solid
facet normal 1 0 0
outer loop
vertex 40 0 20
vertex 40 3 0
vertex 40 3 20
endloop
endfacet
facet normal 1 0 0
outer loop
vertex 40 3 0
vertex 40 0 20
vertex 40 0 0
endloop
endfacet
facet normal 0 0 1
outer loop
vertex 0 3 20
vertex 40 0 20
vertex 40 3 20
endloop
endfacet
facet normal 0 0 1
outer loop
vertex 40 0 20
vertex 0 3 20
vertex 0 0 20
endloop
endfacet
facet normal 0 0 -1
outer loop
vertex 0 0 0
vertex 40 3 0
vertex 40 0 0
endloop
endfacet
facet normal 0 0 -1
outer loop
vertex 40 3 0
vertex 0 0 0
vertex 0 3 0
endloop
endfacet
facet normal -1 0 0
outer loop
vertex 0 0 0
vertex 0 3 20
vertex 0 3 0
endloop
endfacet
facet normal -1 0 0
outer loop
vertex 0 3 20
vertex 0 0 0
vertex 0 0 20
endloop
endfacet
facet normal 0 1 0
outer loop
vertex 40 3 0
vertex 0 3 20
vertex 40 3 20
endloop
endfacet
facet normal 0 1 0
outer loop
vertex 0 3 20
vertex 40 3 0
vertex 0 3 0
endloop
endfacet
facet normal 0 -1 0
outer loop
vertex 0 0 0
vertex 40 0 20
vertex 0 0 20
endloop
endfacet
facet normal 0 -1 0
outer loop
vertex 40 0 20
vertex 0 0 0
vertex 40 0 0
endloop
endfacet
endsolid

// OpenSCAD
// file: config.scad
// --- Robot Dimensions ---
track_width = 50;        // mm
sprocket_diameter = 50;  // mm
motor_length = 54;       // mm
motor_shaft = 6;         // D-shaft diameter
motor_mount_hole = 3;    // M3
battery_length = 75;     // mm
battery_width  = 55;     // mm
battery_height = 20;     // mm
jetson_plate_length = 120; // mm
jetson_plate_width  = 100; // mm
chassis_thickness = 5;      // mm
// main file
include <config.scad>;

module oled_mount() {
    width = 40;
    height = 20;
    thickness = 3;

    cube([width, thickness, height]);

    // Cutout for screen
    translate([2, 0, 2])
        cube([width-4, thickness, height-4]);
}

oled_mount();
